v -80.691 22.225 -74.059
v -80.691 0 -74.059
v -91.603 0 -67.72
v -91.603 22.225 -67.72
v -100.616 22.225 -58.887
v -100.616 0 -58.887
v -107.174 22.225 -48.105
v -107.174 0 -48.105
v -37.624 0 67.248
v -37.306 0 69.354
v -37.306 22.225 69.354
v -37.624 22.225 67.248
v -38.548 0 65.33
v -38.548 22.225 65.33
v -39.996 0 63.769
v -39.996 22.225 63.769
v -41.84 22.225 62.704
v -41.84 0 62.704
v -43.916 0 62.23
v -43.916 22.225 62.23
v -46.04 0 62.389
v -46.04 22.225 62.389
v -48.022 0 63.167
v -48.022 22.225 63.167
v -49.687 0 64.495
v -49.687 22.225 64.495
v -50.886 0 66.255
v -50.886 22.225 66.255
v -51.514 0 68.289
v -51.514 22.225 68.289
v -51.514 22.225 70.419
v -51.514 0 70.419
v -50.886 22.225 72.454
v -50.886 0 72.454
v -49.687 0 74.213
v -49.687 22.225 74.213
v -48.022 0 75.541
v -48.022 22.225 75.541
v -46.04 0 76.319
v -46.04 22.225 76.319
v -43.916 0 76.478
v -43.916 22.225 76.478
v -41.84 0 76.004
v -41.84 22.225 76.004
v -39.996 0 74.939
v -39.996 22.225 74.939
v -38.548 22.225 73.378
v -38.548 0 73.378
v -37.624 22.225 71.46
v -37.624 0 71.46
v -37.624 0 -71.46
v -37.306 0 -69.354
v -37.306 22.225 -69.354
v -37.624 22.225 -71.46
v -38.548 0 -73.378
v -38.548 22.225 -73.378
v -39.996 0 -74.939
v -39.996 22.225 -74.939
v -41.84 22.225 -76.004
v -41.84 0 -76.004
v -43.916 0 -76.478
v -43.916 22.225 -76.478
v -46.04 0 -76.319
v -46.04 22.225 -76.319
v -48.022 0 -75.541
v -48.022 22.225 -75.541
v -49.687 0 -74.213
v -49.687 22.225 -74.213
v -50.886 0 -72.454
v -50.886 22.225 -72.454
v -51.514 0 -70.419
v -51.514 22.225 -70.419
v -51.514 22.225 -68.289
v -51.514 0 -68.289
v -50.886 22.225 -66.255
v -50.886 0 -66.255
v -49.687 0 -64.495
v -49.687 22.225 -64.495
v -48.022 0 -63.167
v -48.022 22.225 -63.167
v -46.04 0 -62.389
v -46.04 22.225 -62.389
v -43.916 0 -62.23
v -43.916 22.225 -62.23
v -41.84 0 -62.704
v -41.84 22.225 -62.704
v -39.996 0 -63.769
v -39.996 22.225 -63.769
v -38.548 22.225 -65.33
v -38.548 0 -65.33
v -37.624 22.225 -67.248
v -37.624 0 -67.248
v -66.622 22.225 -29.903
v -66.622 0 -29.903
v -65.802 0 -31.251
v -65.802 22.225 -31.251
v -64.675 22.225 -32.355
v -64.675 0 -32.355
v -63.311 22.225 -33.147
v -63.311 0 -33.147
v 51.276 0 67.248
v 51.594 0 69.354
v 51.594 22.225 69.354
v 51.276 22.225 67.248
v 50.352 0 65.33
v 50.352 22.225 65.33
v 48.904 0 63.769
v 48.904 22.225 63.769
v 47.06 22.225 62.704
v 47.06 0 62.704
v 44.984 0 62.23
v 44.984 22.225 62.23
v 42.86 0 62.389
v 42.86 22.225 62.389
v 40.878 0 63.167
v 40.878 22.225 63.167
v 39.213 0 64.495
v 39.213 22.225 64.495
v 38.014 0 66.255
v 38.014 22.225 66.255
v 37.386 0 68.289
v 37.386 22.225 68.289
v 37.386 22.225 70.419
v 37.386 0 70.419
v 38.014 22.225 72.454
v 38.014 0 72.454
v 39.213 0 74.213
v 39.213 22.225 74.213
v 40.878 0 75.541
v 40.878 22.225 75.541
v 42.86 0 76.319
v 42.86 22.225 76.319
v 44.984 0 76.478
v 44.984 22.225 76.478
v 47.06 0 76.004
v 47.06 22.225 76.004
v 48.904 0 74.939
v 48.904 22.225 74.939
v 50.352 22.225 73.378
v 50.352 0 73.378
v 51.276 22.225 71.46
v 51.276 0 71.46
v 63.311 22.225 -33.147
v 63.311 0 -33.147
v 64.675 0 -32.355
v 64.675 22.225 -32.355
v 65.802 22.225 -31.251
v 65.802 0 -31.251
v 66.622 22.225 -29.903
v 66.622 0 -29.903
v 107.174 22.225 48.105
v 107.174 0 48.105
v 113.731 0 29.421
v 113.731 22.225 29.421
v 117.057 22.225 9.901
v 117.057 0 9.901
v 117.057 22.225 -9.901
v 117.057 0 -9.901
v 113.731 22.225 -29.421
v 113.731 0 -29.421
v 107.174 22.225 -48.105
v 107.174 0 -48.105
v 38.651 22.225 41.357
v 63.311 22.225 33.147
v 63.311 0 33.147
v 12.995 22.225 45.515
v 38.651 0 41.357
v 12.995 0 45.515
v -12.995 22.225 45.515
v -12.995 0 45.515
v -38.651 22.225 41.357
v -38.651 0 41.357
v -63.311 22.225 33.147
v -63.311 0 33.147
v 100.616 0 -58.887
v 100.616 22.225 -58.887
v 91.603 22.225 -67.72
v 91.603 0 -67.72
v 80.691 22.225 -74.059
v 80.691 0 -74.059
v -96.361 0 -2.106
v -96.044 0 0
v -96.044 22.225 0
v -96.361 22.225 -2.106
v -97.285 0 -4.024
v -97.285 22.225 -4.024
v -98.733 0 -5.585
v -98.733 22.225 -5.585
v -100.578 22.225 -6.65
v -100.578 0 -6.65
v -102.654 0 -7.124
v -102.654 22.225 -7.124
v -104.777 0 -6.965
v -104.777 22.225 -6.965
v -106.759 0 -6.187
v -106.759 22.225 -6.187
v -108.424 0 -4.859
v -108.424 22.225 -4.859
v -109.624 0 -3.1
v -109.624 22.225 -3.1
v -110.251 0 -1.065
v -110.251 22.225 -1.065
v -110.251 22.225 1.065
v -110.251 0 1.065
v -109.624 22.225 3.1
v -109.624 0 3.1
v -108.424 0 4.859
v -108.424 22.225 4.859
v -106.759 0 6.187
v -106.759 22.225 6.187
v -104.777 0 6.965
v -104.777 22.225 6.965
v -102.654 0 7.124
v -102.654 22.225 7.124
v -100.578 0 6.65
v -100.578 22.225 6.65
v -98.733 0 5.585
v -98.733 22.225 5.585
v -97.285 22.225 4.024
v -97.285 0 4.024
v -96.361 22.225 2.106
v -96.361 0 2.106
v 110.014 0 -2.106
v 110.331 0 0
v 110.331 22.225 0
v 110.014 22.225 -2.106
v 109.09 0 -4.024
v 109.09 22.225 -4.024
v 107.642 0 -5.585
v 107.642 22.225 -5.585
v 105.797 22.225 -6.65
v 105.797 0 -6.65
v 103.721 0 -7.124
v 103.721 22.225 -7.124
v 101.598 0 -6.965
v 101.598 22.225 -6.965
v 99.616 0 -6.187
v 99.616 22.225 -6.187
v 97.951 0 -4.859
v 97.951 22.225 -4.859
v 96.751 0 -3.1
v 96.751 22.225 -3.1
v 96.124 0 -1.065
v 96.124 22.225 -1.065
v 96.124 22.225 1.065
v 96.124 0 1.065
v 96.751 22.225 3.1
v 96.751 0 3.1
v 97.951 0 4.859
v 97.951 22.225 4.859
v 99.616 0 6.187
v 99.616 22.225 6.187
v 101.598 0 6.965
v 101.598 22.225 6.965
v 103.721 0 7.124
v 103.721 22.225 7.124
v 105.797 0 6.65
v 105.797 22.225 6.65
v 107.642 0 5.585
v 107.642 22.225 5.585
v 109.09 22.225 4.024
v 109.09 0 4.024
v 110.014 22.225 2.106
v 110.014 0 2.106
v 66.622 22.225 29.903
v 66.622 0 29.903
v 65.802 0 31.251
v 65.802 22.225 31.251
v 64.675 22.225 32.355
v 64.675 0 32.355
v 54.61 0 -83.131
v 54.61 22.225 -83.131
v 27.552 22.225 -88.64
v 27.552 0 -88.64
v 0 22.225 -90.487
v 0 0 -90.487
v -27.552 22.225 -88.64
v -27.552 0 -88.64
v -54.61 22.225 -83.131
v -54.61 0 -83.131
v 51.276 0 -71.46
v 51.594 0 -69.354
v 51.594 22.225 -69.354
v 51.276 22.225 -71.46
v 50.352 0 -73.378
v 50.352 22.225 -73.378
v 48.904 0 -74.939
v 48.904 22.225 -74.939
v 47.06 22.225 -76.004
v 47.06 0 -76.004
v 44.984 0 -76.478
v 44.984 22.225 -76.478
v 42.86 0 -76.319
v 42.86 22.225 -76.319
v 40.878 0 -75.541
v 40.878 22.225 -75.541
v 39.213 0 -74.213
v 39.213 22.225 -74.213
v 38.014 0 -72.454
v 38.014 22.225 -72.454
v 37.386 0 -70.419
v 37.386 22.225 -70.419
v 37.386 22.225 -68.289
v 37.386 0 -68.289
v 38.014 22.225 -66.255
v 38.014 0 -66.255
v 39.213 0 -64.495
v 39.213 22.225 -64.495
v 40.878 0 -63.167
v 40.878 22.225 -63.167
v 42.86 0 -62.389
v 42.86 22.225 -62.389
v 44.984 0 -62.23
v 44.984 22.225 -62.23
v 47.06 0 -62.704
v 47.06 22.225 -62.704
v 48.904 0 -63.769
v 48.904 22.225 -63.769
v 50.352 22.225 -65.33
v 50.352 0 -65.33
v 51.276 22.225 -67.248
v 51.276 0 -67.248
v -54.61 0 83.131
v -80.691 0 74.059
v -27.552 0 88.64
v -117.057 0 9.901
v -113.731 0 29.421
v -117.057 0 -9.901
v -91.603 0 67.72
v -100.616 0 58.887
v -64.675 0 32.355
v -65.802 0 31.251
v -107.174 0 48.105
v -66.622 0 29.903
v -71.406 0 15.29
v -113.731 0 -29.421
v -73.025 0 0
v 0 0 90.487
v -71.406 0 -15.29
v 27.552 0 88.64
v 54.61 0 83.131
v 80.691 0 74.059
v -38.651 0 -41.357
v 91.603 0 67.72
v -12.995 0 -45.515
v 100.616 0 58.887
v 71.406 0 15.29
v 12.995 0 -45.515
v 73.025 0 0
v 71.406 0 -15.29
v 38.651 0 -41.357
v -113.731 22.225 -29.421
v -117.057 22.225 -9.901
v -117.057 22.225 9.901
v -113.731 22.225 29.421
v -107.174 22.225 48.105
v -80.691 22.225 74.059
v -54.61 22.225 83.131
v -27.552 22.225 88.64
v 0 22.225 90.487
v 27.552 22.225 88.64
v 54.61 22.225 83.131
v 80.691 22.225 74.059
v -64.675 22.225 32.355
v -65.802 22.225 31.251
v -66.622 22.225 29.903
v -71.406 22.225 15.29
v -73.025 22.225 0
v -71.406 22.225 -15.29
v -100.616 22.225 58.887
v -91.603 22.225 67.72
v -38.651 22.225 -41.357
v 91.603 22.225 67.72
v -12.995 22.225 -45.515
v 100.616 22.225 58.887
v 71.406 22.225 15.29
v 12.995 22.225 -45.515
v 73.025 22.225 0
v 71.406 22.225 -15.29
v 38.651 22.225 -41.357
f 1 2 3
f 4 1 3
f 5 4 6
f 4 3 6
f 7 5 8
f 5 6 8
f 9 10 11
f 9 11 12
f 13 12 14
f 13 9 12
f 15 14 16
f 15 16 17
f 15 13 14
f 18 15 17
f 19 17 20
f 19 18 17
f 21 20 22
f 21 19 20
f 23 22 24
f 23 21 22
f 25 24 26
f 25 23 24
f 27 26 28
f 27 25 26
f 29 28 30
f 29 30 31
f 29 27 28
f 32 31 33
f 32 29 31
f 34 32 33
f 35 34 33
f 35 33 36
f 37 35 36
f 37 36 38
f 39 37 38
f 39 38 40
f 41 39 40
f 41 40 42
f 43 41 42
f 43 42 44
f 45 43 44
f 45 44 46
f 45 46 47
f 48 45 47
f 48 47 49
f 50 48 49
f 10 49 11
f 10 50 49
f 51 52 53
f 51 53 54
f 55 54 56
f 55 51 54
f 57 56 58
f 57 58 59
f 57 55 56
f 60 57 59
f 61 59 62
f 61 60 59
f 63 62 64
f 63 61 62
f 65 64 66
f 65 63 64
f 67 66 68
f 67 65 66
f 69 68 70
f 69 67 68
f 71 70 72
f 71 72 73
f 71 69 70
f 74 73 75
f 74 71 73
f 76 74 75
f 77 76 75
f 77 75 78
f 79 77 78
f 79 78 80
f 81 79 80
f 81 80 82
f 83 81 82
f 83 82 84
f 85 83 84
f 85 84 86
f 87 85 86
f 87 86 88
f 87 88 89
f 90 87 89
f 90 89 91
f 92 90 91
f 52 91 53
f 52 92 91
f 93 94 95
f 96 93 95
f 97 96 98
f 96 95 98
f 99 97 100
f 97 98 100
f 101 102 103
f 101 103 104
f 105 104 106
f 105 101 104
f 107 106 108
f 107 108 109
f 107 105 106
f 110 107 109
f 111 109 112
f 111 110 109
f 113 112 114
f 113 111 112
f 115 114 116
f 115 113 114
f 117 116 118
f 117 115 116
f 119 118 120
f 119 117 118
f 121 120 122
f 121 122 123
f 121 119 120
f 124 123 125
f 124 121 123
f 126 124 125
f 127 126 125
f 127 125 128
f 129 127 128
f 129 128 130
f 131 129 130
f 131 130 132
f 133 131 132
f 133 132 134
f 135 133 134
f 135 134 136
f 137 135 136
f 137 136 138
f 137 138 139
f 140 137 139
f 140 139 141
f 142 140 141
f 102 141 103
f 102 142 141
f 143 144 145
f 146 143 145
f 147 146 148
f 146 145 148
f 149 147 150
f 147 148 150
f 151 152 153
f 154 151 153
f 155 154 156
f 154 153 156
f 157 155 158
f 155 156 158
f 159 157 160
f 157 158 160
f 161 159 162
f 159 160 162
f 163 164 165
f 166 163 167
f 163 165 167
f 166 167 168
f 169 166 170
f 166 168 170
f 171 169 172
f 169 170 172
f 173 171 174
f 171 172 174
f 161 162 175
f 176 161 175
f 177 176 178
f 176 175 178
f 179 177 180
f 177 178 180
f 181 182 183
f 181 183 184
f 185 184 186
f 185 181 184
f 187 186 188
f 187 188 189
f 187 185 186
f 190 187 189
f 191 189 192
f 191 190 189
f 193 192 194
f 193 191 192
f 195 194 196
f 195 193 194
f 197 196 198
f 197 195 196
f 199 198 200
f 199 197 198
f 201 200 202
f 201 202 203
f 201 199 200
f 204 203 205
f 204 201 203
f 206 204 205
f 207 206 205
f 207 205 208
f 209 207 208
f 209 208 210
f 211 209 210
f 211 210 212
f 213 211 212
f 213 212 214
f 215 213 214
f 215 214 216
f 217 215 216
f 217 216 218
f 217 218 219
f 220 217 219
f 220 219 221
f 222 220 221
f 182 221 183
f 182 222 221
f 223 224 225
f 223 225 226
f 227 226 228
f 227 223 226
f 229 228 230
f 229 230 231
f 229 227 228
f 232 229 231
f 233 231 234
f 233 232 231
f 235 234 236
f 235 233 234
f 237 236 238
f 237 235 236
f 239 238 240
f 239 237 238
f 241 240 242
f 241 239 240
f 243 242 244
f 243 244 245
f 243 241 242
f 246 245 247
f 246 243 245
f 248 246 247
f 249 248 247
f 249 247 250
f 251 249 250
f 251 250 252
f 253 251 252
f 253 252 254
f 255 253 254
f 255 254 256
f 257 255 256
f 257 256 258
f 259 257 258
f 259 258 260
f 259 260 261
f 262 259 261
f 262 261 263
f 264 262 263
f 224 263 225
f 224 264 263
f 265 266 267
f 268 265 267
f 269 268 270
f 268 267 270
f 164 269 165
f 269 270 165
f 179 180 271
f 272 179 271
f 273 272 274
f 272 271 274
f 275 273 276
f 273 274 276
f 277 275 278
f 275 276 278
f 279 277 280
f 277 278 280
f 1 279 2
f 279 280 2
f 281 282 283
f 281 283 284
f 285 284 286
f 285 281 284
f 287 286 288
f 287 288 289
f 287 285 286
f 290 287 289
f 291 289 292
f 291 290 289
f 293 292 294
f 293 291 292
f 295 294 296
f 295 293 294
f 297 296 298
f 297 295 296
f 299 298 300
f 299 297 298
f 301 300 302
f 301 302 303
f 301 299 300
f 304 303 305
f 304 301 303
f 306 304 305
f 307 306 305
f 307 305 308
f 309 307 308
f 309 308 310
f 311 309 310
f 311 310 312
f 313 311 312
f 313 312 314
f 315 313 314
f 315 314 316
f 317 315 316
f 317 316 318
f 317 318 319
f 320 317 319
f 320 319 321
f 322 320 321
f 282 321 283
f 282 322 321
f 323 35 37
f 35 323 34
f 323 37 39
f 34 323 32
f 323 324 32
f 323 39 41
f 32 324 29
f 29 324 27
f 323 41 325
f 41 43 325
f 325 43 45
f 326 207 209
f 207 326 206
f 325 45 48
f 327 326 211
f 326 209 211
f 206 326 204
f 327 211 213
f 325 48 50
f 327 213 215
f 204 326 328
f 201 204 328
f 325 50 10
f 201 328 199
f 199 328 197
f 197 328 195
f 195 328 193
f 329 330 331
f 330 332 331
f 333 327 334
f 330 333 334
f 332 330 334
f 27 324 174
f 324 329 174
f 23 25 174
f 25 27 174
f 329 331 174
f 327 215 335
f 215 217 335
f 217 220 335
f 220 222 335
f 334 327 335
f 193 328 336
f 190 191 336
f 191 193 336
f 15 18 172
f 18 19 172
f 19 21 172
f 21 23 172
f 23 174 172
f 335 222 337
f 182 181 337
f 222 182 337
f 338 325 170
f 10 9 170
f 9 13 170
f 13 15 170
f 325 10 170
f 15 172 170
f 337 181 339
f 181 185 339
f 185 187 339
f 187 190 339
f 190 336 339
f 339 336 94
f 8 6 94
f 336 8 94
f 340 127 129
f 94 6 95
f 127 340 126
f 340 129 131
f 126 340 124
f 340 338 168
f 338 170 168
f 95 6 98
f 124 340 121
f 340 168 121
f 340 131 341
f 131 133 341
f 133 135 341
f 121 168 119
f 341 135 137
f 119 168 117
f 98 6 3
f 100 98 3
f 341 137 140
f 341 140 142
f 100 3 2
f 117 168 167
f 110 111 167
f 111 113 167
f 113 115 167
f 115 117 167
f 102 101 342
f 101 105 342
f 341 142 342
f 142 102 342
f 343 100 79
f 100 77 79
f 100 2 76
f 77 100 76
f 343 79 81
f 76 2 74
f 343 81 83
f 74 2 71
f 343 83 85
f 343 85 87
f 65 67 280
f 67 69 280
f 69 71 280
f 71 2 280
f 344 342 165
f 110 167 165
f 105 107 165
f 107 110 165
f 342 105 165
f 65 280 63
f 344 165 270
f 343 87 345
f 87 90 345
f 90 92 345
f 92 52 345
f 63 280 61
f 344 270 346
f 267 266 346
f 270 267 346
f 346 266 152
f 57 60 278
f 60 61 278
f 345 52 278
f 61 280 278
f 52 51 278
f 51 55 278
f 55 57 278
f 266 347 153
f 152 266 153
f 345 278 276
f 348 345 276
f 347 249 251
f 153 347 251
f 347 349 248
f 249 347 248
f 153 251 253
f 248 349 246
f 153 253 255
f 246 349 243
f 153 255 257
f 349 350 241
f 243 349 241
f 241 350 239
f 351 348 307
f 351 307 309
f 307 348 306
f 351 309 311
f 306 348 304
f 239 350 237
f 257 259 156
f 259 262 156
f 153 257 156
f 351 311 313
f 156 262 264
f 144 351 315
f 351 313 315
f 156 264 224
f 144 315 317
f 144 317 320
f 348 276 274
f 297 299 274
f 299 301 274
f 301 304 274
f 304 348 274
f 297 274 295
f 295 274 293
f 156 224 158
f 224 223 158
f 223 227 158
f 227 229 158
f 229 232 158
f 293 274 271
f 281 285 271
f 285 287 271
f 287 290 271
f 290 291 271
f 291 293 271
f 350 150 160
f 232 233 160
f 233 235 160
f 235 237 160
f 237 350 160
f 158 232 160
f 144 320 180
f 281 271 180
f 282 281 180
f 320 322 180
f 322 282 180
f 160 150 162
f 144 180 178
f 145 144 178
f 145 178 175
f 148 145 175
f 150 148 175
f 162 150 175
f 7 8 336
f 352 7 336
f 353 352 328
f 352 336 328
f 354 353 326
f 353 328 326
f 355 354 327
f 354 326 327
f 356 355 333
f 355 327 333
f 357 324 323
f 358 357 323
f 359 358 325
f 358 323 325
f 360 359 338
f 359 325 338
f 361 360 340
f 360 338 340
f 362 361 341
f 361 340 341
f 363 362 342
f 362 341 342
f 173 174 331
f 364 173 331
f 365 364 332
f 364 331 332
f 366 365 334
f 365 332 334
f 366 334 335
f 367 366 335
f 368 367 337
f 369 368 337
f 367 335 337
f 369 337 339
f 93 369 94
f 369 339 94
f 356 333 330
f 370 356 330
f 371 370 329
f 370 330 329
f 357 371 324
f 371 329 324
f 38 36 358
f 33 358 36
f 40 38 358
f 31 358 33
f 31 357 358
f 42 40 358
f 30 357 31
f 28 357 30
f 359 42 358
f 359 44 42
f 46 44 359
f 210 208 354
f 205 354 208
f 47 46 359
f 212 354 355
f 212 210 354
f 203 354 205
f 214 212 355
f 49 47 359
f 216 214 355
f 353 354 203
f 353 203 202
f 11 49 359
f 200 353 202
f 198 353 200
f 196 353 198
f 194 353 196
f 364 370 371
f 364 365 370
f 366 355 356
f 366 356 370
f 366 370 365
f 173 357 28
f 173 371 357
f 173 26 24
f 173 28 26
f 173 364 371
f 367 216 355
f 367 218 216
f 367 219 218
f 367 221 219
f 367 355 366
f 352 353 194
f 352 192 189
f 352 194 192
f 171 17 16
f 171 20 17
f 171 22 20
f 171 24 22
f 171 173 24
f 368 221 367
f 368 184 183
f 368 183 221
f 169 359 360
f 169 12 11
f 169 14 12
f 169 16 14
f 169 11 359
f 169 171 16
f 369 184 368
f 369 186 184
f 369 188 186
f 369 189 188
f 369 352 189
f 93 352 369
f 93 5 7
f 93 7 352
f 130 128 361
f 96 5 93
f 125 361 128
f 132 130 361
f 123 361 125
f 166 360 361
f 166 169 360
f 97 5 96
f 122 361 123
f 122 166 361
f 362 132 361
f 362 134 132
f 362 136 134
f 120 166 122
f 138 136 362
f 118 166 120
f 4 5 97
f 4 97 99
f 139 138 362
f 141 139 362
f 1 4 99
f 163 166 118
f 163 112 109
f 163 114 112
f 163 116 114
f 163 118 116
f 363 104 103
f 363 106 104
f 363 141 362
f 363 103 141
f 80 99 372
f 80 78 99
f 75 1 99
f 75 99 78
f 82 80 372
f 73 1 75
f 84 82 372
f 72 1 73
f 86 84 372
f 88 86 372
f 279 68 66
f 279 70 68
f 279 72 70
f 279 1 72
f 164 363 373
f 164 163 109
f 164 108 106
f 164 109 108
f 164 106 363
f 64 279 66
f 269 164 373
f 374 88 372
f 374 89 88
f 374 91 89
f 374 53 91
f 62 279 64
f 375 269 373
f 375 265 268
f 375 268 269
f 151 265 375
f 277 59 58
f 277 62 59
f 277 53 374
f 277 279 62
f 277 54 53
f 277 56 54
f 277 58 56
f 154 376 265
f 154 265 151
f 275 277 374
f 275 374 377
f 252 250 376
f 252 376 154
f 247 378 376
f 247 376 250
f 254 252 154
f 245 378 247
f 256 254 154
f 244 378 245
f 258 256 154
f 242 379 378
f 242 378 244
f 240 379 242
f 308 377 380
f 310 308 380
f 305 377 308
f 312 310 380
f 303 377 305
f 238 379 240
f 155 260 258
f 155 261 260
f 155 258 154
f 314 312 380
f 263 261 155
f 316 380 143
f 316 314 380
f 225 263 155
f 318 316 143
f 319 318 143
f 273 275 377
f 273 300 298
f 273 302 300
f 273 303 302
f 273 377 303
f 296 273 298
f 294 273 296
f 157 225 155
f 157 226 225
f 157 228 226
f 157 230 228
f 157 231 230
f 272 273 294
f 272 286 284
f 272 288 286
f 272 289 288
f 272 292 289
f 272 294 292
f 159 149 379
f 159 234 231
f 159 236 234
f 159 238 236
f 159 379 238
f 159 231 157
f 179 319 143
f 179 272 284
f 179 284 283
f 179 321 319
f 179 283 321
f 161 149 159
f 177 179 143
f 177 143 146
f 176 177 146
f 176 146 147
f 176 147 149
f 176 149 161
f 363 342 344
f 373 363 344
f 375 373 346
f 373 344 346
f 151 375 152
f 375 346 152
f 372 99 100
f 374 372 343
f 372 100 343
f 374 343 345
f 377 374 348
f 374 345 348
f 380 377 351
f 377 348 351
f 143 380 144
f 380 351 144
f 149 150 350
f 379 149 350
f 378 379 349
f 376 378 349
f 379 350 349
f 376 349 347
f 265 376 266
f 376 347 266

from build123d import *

# Parameters (mm, degrees)
SKETCH1_R           = 7.14375
BOSS_EXTRUDE1_DEPTH = 22.225


with BuildPart() as part:
    # Sketch1 → Boss-Extrude1 (new body)
    with BuildSketch(Plane(origin=(0, 0, 0), x_dir=(1, 0, 0), z_dir=(0, 1, 0))):
        with BuildLine():
            ThreePointArc((80.690921224, 74.058849944), (0, 90.4875), (-80.690921224, 74.058849944))
            ThreePointArc((-80.690921224, 74.058849944), (-96.385165084, 63.584590133), (-107.174095369, 48.104977984))
            ThreePointArc((-107.174095369, 48.104977984), (-117.475, 0), (-107.174095369, -48.104977984))
            ThreePointArc((-107.174095369, -48.104977984), (-96.385165084, -63.584590133), (-80.690921224, -74.058849944))
            ThreePointArc((-80.690921224, -74.058849944), (0, -90.4875), (80.690921224, -74.058849944))
            ThreePointArc((80.690921224, -74.058849944), (96.385165084, -63.584590133), (107.174095369, -48.104977984))
            ThreePointArc((107.174095369, -48.104977984), (117.475, 0), (107.174095369, 48.104977984))
            ThreePointArc((107.174095369, 48.104977984), (96.385165084, 63.584590133), (80.690921224, 74.058849944))
        make_face()
        with Locations((-103.1875, 0)):
            Circle(SKETCH1_R, mode=Mode.SUBTRACT)
        with Locations((-44.45, 69.354092252)):
            Circle(SKETCH1_R, mode=Mode.SUBTRACT)
        with Locations((103.1875, 0)):
            Circle(SKETCH1_R, mode=Mode.SUBTRACT)
        with Locations((44.45, 69.354092252)):
            Circle(SKETCH1_R, mode=Mode.SUBTRACT)
        with Locations((-44.45, -69.354092252)):
            Circle(SKETCH1_R, mode=Mode.SUBTRACT)
        with Locations((44.45, -69.354092252)):
            Circle(SKETCH1_R, mode=Mode.SUBTRACT)
        with BuildLine():
            ThreePointArc((-66.621734959, -29.903094423), (-73.025, 0), (-66.621734959, 29.903094423))
            ThreePointArc((-66.621734959, 29.903094423), (-65.273118673, 31.838045941), (-63.311338191, 33.147328418))
            ThreePointArc((-63.311338191, 33.147328418), (0, 46.0375), (63.311338191, 33.147328418))
            ThreePointArc((63.311338191, 33.147328418), (65.273118673, 31.838045941), (66.621734959, 29.903094423))
            ThreePointArc((66.621734959, 29.903094423), (73.025, 0), (66.621734959, -29.903094423))
            ThreePointArc((66.621734959, -29.903094423), (65.273118673, -31.838045941), (63.311338191, -33.147328418))
            ThreePointArc((63.311338191, -33.147328418), (0, -46.0375), (-63.311338191, -33.147328418))
            ThreePointArc((-63.311338191, -33.147328418), (-65.273118673, -31.838045941), (-66.621734959, -29.903094423))
        make_face(mode=Mode.SUBTRACT)
    extrude(amount=BOSS_EXTRUDE1_DEPTH)


solid = part.part
